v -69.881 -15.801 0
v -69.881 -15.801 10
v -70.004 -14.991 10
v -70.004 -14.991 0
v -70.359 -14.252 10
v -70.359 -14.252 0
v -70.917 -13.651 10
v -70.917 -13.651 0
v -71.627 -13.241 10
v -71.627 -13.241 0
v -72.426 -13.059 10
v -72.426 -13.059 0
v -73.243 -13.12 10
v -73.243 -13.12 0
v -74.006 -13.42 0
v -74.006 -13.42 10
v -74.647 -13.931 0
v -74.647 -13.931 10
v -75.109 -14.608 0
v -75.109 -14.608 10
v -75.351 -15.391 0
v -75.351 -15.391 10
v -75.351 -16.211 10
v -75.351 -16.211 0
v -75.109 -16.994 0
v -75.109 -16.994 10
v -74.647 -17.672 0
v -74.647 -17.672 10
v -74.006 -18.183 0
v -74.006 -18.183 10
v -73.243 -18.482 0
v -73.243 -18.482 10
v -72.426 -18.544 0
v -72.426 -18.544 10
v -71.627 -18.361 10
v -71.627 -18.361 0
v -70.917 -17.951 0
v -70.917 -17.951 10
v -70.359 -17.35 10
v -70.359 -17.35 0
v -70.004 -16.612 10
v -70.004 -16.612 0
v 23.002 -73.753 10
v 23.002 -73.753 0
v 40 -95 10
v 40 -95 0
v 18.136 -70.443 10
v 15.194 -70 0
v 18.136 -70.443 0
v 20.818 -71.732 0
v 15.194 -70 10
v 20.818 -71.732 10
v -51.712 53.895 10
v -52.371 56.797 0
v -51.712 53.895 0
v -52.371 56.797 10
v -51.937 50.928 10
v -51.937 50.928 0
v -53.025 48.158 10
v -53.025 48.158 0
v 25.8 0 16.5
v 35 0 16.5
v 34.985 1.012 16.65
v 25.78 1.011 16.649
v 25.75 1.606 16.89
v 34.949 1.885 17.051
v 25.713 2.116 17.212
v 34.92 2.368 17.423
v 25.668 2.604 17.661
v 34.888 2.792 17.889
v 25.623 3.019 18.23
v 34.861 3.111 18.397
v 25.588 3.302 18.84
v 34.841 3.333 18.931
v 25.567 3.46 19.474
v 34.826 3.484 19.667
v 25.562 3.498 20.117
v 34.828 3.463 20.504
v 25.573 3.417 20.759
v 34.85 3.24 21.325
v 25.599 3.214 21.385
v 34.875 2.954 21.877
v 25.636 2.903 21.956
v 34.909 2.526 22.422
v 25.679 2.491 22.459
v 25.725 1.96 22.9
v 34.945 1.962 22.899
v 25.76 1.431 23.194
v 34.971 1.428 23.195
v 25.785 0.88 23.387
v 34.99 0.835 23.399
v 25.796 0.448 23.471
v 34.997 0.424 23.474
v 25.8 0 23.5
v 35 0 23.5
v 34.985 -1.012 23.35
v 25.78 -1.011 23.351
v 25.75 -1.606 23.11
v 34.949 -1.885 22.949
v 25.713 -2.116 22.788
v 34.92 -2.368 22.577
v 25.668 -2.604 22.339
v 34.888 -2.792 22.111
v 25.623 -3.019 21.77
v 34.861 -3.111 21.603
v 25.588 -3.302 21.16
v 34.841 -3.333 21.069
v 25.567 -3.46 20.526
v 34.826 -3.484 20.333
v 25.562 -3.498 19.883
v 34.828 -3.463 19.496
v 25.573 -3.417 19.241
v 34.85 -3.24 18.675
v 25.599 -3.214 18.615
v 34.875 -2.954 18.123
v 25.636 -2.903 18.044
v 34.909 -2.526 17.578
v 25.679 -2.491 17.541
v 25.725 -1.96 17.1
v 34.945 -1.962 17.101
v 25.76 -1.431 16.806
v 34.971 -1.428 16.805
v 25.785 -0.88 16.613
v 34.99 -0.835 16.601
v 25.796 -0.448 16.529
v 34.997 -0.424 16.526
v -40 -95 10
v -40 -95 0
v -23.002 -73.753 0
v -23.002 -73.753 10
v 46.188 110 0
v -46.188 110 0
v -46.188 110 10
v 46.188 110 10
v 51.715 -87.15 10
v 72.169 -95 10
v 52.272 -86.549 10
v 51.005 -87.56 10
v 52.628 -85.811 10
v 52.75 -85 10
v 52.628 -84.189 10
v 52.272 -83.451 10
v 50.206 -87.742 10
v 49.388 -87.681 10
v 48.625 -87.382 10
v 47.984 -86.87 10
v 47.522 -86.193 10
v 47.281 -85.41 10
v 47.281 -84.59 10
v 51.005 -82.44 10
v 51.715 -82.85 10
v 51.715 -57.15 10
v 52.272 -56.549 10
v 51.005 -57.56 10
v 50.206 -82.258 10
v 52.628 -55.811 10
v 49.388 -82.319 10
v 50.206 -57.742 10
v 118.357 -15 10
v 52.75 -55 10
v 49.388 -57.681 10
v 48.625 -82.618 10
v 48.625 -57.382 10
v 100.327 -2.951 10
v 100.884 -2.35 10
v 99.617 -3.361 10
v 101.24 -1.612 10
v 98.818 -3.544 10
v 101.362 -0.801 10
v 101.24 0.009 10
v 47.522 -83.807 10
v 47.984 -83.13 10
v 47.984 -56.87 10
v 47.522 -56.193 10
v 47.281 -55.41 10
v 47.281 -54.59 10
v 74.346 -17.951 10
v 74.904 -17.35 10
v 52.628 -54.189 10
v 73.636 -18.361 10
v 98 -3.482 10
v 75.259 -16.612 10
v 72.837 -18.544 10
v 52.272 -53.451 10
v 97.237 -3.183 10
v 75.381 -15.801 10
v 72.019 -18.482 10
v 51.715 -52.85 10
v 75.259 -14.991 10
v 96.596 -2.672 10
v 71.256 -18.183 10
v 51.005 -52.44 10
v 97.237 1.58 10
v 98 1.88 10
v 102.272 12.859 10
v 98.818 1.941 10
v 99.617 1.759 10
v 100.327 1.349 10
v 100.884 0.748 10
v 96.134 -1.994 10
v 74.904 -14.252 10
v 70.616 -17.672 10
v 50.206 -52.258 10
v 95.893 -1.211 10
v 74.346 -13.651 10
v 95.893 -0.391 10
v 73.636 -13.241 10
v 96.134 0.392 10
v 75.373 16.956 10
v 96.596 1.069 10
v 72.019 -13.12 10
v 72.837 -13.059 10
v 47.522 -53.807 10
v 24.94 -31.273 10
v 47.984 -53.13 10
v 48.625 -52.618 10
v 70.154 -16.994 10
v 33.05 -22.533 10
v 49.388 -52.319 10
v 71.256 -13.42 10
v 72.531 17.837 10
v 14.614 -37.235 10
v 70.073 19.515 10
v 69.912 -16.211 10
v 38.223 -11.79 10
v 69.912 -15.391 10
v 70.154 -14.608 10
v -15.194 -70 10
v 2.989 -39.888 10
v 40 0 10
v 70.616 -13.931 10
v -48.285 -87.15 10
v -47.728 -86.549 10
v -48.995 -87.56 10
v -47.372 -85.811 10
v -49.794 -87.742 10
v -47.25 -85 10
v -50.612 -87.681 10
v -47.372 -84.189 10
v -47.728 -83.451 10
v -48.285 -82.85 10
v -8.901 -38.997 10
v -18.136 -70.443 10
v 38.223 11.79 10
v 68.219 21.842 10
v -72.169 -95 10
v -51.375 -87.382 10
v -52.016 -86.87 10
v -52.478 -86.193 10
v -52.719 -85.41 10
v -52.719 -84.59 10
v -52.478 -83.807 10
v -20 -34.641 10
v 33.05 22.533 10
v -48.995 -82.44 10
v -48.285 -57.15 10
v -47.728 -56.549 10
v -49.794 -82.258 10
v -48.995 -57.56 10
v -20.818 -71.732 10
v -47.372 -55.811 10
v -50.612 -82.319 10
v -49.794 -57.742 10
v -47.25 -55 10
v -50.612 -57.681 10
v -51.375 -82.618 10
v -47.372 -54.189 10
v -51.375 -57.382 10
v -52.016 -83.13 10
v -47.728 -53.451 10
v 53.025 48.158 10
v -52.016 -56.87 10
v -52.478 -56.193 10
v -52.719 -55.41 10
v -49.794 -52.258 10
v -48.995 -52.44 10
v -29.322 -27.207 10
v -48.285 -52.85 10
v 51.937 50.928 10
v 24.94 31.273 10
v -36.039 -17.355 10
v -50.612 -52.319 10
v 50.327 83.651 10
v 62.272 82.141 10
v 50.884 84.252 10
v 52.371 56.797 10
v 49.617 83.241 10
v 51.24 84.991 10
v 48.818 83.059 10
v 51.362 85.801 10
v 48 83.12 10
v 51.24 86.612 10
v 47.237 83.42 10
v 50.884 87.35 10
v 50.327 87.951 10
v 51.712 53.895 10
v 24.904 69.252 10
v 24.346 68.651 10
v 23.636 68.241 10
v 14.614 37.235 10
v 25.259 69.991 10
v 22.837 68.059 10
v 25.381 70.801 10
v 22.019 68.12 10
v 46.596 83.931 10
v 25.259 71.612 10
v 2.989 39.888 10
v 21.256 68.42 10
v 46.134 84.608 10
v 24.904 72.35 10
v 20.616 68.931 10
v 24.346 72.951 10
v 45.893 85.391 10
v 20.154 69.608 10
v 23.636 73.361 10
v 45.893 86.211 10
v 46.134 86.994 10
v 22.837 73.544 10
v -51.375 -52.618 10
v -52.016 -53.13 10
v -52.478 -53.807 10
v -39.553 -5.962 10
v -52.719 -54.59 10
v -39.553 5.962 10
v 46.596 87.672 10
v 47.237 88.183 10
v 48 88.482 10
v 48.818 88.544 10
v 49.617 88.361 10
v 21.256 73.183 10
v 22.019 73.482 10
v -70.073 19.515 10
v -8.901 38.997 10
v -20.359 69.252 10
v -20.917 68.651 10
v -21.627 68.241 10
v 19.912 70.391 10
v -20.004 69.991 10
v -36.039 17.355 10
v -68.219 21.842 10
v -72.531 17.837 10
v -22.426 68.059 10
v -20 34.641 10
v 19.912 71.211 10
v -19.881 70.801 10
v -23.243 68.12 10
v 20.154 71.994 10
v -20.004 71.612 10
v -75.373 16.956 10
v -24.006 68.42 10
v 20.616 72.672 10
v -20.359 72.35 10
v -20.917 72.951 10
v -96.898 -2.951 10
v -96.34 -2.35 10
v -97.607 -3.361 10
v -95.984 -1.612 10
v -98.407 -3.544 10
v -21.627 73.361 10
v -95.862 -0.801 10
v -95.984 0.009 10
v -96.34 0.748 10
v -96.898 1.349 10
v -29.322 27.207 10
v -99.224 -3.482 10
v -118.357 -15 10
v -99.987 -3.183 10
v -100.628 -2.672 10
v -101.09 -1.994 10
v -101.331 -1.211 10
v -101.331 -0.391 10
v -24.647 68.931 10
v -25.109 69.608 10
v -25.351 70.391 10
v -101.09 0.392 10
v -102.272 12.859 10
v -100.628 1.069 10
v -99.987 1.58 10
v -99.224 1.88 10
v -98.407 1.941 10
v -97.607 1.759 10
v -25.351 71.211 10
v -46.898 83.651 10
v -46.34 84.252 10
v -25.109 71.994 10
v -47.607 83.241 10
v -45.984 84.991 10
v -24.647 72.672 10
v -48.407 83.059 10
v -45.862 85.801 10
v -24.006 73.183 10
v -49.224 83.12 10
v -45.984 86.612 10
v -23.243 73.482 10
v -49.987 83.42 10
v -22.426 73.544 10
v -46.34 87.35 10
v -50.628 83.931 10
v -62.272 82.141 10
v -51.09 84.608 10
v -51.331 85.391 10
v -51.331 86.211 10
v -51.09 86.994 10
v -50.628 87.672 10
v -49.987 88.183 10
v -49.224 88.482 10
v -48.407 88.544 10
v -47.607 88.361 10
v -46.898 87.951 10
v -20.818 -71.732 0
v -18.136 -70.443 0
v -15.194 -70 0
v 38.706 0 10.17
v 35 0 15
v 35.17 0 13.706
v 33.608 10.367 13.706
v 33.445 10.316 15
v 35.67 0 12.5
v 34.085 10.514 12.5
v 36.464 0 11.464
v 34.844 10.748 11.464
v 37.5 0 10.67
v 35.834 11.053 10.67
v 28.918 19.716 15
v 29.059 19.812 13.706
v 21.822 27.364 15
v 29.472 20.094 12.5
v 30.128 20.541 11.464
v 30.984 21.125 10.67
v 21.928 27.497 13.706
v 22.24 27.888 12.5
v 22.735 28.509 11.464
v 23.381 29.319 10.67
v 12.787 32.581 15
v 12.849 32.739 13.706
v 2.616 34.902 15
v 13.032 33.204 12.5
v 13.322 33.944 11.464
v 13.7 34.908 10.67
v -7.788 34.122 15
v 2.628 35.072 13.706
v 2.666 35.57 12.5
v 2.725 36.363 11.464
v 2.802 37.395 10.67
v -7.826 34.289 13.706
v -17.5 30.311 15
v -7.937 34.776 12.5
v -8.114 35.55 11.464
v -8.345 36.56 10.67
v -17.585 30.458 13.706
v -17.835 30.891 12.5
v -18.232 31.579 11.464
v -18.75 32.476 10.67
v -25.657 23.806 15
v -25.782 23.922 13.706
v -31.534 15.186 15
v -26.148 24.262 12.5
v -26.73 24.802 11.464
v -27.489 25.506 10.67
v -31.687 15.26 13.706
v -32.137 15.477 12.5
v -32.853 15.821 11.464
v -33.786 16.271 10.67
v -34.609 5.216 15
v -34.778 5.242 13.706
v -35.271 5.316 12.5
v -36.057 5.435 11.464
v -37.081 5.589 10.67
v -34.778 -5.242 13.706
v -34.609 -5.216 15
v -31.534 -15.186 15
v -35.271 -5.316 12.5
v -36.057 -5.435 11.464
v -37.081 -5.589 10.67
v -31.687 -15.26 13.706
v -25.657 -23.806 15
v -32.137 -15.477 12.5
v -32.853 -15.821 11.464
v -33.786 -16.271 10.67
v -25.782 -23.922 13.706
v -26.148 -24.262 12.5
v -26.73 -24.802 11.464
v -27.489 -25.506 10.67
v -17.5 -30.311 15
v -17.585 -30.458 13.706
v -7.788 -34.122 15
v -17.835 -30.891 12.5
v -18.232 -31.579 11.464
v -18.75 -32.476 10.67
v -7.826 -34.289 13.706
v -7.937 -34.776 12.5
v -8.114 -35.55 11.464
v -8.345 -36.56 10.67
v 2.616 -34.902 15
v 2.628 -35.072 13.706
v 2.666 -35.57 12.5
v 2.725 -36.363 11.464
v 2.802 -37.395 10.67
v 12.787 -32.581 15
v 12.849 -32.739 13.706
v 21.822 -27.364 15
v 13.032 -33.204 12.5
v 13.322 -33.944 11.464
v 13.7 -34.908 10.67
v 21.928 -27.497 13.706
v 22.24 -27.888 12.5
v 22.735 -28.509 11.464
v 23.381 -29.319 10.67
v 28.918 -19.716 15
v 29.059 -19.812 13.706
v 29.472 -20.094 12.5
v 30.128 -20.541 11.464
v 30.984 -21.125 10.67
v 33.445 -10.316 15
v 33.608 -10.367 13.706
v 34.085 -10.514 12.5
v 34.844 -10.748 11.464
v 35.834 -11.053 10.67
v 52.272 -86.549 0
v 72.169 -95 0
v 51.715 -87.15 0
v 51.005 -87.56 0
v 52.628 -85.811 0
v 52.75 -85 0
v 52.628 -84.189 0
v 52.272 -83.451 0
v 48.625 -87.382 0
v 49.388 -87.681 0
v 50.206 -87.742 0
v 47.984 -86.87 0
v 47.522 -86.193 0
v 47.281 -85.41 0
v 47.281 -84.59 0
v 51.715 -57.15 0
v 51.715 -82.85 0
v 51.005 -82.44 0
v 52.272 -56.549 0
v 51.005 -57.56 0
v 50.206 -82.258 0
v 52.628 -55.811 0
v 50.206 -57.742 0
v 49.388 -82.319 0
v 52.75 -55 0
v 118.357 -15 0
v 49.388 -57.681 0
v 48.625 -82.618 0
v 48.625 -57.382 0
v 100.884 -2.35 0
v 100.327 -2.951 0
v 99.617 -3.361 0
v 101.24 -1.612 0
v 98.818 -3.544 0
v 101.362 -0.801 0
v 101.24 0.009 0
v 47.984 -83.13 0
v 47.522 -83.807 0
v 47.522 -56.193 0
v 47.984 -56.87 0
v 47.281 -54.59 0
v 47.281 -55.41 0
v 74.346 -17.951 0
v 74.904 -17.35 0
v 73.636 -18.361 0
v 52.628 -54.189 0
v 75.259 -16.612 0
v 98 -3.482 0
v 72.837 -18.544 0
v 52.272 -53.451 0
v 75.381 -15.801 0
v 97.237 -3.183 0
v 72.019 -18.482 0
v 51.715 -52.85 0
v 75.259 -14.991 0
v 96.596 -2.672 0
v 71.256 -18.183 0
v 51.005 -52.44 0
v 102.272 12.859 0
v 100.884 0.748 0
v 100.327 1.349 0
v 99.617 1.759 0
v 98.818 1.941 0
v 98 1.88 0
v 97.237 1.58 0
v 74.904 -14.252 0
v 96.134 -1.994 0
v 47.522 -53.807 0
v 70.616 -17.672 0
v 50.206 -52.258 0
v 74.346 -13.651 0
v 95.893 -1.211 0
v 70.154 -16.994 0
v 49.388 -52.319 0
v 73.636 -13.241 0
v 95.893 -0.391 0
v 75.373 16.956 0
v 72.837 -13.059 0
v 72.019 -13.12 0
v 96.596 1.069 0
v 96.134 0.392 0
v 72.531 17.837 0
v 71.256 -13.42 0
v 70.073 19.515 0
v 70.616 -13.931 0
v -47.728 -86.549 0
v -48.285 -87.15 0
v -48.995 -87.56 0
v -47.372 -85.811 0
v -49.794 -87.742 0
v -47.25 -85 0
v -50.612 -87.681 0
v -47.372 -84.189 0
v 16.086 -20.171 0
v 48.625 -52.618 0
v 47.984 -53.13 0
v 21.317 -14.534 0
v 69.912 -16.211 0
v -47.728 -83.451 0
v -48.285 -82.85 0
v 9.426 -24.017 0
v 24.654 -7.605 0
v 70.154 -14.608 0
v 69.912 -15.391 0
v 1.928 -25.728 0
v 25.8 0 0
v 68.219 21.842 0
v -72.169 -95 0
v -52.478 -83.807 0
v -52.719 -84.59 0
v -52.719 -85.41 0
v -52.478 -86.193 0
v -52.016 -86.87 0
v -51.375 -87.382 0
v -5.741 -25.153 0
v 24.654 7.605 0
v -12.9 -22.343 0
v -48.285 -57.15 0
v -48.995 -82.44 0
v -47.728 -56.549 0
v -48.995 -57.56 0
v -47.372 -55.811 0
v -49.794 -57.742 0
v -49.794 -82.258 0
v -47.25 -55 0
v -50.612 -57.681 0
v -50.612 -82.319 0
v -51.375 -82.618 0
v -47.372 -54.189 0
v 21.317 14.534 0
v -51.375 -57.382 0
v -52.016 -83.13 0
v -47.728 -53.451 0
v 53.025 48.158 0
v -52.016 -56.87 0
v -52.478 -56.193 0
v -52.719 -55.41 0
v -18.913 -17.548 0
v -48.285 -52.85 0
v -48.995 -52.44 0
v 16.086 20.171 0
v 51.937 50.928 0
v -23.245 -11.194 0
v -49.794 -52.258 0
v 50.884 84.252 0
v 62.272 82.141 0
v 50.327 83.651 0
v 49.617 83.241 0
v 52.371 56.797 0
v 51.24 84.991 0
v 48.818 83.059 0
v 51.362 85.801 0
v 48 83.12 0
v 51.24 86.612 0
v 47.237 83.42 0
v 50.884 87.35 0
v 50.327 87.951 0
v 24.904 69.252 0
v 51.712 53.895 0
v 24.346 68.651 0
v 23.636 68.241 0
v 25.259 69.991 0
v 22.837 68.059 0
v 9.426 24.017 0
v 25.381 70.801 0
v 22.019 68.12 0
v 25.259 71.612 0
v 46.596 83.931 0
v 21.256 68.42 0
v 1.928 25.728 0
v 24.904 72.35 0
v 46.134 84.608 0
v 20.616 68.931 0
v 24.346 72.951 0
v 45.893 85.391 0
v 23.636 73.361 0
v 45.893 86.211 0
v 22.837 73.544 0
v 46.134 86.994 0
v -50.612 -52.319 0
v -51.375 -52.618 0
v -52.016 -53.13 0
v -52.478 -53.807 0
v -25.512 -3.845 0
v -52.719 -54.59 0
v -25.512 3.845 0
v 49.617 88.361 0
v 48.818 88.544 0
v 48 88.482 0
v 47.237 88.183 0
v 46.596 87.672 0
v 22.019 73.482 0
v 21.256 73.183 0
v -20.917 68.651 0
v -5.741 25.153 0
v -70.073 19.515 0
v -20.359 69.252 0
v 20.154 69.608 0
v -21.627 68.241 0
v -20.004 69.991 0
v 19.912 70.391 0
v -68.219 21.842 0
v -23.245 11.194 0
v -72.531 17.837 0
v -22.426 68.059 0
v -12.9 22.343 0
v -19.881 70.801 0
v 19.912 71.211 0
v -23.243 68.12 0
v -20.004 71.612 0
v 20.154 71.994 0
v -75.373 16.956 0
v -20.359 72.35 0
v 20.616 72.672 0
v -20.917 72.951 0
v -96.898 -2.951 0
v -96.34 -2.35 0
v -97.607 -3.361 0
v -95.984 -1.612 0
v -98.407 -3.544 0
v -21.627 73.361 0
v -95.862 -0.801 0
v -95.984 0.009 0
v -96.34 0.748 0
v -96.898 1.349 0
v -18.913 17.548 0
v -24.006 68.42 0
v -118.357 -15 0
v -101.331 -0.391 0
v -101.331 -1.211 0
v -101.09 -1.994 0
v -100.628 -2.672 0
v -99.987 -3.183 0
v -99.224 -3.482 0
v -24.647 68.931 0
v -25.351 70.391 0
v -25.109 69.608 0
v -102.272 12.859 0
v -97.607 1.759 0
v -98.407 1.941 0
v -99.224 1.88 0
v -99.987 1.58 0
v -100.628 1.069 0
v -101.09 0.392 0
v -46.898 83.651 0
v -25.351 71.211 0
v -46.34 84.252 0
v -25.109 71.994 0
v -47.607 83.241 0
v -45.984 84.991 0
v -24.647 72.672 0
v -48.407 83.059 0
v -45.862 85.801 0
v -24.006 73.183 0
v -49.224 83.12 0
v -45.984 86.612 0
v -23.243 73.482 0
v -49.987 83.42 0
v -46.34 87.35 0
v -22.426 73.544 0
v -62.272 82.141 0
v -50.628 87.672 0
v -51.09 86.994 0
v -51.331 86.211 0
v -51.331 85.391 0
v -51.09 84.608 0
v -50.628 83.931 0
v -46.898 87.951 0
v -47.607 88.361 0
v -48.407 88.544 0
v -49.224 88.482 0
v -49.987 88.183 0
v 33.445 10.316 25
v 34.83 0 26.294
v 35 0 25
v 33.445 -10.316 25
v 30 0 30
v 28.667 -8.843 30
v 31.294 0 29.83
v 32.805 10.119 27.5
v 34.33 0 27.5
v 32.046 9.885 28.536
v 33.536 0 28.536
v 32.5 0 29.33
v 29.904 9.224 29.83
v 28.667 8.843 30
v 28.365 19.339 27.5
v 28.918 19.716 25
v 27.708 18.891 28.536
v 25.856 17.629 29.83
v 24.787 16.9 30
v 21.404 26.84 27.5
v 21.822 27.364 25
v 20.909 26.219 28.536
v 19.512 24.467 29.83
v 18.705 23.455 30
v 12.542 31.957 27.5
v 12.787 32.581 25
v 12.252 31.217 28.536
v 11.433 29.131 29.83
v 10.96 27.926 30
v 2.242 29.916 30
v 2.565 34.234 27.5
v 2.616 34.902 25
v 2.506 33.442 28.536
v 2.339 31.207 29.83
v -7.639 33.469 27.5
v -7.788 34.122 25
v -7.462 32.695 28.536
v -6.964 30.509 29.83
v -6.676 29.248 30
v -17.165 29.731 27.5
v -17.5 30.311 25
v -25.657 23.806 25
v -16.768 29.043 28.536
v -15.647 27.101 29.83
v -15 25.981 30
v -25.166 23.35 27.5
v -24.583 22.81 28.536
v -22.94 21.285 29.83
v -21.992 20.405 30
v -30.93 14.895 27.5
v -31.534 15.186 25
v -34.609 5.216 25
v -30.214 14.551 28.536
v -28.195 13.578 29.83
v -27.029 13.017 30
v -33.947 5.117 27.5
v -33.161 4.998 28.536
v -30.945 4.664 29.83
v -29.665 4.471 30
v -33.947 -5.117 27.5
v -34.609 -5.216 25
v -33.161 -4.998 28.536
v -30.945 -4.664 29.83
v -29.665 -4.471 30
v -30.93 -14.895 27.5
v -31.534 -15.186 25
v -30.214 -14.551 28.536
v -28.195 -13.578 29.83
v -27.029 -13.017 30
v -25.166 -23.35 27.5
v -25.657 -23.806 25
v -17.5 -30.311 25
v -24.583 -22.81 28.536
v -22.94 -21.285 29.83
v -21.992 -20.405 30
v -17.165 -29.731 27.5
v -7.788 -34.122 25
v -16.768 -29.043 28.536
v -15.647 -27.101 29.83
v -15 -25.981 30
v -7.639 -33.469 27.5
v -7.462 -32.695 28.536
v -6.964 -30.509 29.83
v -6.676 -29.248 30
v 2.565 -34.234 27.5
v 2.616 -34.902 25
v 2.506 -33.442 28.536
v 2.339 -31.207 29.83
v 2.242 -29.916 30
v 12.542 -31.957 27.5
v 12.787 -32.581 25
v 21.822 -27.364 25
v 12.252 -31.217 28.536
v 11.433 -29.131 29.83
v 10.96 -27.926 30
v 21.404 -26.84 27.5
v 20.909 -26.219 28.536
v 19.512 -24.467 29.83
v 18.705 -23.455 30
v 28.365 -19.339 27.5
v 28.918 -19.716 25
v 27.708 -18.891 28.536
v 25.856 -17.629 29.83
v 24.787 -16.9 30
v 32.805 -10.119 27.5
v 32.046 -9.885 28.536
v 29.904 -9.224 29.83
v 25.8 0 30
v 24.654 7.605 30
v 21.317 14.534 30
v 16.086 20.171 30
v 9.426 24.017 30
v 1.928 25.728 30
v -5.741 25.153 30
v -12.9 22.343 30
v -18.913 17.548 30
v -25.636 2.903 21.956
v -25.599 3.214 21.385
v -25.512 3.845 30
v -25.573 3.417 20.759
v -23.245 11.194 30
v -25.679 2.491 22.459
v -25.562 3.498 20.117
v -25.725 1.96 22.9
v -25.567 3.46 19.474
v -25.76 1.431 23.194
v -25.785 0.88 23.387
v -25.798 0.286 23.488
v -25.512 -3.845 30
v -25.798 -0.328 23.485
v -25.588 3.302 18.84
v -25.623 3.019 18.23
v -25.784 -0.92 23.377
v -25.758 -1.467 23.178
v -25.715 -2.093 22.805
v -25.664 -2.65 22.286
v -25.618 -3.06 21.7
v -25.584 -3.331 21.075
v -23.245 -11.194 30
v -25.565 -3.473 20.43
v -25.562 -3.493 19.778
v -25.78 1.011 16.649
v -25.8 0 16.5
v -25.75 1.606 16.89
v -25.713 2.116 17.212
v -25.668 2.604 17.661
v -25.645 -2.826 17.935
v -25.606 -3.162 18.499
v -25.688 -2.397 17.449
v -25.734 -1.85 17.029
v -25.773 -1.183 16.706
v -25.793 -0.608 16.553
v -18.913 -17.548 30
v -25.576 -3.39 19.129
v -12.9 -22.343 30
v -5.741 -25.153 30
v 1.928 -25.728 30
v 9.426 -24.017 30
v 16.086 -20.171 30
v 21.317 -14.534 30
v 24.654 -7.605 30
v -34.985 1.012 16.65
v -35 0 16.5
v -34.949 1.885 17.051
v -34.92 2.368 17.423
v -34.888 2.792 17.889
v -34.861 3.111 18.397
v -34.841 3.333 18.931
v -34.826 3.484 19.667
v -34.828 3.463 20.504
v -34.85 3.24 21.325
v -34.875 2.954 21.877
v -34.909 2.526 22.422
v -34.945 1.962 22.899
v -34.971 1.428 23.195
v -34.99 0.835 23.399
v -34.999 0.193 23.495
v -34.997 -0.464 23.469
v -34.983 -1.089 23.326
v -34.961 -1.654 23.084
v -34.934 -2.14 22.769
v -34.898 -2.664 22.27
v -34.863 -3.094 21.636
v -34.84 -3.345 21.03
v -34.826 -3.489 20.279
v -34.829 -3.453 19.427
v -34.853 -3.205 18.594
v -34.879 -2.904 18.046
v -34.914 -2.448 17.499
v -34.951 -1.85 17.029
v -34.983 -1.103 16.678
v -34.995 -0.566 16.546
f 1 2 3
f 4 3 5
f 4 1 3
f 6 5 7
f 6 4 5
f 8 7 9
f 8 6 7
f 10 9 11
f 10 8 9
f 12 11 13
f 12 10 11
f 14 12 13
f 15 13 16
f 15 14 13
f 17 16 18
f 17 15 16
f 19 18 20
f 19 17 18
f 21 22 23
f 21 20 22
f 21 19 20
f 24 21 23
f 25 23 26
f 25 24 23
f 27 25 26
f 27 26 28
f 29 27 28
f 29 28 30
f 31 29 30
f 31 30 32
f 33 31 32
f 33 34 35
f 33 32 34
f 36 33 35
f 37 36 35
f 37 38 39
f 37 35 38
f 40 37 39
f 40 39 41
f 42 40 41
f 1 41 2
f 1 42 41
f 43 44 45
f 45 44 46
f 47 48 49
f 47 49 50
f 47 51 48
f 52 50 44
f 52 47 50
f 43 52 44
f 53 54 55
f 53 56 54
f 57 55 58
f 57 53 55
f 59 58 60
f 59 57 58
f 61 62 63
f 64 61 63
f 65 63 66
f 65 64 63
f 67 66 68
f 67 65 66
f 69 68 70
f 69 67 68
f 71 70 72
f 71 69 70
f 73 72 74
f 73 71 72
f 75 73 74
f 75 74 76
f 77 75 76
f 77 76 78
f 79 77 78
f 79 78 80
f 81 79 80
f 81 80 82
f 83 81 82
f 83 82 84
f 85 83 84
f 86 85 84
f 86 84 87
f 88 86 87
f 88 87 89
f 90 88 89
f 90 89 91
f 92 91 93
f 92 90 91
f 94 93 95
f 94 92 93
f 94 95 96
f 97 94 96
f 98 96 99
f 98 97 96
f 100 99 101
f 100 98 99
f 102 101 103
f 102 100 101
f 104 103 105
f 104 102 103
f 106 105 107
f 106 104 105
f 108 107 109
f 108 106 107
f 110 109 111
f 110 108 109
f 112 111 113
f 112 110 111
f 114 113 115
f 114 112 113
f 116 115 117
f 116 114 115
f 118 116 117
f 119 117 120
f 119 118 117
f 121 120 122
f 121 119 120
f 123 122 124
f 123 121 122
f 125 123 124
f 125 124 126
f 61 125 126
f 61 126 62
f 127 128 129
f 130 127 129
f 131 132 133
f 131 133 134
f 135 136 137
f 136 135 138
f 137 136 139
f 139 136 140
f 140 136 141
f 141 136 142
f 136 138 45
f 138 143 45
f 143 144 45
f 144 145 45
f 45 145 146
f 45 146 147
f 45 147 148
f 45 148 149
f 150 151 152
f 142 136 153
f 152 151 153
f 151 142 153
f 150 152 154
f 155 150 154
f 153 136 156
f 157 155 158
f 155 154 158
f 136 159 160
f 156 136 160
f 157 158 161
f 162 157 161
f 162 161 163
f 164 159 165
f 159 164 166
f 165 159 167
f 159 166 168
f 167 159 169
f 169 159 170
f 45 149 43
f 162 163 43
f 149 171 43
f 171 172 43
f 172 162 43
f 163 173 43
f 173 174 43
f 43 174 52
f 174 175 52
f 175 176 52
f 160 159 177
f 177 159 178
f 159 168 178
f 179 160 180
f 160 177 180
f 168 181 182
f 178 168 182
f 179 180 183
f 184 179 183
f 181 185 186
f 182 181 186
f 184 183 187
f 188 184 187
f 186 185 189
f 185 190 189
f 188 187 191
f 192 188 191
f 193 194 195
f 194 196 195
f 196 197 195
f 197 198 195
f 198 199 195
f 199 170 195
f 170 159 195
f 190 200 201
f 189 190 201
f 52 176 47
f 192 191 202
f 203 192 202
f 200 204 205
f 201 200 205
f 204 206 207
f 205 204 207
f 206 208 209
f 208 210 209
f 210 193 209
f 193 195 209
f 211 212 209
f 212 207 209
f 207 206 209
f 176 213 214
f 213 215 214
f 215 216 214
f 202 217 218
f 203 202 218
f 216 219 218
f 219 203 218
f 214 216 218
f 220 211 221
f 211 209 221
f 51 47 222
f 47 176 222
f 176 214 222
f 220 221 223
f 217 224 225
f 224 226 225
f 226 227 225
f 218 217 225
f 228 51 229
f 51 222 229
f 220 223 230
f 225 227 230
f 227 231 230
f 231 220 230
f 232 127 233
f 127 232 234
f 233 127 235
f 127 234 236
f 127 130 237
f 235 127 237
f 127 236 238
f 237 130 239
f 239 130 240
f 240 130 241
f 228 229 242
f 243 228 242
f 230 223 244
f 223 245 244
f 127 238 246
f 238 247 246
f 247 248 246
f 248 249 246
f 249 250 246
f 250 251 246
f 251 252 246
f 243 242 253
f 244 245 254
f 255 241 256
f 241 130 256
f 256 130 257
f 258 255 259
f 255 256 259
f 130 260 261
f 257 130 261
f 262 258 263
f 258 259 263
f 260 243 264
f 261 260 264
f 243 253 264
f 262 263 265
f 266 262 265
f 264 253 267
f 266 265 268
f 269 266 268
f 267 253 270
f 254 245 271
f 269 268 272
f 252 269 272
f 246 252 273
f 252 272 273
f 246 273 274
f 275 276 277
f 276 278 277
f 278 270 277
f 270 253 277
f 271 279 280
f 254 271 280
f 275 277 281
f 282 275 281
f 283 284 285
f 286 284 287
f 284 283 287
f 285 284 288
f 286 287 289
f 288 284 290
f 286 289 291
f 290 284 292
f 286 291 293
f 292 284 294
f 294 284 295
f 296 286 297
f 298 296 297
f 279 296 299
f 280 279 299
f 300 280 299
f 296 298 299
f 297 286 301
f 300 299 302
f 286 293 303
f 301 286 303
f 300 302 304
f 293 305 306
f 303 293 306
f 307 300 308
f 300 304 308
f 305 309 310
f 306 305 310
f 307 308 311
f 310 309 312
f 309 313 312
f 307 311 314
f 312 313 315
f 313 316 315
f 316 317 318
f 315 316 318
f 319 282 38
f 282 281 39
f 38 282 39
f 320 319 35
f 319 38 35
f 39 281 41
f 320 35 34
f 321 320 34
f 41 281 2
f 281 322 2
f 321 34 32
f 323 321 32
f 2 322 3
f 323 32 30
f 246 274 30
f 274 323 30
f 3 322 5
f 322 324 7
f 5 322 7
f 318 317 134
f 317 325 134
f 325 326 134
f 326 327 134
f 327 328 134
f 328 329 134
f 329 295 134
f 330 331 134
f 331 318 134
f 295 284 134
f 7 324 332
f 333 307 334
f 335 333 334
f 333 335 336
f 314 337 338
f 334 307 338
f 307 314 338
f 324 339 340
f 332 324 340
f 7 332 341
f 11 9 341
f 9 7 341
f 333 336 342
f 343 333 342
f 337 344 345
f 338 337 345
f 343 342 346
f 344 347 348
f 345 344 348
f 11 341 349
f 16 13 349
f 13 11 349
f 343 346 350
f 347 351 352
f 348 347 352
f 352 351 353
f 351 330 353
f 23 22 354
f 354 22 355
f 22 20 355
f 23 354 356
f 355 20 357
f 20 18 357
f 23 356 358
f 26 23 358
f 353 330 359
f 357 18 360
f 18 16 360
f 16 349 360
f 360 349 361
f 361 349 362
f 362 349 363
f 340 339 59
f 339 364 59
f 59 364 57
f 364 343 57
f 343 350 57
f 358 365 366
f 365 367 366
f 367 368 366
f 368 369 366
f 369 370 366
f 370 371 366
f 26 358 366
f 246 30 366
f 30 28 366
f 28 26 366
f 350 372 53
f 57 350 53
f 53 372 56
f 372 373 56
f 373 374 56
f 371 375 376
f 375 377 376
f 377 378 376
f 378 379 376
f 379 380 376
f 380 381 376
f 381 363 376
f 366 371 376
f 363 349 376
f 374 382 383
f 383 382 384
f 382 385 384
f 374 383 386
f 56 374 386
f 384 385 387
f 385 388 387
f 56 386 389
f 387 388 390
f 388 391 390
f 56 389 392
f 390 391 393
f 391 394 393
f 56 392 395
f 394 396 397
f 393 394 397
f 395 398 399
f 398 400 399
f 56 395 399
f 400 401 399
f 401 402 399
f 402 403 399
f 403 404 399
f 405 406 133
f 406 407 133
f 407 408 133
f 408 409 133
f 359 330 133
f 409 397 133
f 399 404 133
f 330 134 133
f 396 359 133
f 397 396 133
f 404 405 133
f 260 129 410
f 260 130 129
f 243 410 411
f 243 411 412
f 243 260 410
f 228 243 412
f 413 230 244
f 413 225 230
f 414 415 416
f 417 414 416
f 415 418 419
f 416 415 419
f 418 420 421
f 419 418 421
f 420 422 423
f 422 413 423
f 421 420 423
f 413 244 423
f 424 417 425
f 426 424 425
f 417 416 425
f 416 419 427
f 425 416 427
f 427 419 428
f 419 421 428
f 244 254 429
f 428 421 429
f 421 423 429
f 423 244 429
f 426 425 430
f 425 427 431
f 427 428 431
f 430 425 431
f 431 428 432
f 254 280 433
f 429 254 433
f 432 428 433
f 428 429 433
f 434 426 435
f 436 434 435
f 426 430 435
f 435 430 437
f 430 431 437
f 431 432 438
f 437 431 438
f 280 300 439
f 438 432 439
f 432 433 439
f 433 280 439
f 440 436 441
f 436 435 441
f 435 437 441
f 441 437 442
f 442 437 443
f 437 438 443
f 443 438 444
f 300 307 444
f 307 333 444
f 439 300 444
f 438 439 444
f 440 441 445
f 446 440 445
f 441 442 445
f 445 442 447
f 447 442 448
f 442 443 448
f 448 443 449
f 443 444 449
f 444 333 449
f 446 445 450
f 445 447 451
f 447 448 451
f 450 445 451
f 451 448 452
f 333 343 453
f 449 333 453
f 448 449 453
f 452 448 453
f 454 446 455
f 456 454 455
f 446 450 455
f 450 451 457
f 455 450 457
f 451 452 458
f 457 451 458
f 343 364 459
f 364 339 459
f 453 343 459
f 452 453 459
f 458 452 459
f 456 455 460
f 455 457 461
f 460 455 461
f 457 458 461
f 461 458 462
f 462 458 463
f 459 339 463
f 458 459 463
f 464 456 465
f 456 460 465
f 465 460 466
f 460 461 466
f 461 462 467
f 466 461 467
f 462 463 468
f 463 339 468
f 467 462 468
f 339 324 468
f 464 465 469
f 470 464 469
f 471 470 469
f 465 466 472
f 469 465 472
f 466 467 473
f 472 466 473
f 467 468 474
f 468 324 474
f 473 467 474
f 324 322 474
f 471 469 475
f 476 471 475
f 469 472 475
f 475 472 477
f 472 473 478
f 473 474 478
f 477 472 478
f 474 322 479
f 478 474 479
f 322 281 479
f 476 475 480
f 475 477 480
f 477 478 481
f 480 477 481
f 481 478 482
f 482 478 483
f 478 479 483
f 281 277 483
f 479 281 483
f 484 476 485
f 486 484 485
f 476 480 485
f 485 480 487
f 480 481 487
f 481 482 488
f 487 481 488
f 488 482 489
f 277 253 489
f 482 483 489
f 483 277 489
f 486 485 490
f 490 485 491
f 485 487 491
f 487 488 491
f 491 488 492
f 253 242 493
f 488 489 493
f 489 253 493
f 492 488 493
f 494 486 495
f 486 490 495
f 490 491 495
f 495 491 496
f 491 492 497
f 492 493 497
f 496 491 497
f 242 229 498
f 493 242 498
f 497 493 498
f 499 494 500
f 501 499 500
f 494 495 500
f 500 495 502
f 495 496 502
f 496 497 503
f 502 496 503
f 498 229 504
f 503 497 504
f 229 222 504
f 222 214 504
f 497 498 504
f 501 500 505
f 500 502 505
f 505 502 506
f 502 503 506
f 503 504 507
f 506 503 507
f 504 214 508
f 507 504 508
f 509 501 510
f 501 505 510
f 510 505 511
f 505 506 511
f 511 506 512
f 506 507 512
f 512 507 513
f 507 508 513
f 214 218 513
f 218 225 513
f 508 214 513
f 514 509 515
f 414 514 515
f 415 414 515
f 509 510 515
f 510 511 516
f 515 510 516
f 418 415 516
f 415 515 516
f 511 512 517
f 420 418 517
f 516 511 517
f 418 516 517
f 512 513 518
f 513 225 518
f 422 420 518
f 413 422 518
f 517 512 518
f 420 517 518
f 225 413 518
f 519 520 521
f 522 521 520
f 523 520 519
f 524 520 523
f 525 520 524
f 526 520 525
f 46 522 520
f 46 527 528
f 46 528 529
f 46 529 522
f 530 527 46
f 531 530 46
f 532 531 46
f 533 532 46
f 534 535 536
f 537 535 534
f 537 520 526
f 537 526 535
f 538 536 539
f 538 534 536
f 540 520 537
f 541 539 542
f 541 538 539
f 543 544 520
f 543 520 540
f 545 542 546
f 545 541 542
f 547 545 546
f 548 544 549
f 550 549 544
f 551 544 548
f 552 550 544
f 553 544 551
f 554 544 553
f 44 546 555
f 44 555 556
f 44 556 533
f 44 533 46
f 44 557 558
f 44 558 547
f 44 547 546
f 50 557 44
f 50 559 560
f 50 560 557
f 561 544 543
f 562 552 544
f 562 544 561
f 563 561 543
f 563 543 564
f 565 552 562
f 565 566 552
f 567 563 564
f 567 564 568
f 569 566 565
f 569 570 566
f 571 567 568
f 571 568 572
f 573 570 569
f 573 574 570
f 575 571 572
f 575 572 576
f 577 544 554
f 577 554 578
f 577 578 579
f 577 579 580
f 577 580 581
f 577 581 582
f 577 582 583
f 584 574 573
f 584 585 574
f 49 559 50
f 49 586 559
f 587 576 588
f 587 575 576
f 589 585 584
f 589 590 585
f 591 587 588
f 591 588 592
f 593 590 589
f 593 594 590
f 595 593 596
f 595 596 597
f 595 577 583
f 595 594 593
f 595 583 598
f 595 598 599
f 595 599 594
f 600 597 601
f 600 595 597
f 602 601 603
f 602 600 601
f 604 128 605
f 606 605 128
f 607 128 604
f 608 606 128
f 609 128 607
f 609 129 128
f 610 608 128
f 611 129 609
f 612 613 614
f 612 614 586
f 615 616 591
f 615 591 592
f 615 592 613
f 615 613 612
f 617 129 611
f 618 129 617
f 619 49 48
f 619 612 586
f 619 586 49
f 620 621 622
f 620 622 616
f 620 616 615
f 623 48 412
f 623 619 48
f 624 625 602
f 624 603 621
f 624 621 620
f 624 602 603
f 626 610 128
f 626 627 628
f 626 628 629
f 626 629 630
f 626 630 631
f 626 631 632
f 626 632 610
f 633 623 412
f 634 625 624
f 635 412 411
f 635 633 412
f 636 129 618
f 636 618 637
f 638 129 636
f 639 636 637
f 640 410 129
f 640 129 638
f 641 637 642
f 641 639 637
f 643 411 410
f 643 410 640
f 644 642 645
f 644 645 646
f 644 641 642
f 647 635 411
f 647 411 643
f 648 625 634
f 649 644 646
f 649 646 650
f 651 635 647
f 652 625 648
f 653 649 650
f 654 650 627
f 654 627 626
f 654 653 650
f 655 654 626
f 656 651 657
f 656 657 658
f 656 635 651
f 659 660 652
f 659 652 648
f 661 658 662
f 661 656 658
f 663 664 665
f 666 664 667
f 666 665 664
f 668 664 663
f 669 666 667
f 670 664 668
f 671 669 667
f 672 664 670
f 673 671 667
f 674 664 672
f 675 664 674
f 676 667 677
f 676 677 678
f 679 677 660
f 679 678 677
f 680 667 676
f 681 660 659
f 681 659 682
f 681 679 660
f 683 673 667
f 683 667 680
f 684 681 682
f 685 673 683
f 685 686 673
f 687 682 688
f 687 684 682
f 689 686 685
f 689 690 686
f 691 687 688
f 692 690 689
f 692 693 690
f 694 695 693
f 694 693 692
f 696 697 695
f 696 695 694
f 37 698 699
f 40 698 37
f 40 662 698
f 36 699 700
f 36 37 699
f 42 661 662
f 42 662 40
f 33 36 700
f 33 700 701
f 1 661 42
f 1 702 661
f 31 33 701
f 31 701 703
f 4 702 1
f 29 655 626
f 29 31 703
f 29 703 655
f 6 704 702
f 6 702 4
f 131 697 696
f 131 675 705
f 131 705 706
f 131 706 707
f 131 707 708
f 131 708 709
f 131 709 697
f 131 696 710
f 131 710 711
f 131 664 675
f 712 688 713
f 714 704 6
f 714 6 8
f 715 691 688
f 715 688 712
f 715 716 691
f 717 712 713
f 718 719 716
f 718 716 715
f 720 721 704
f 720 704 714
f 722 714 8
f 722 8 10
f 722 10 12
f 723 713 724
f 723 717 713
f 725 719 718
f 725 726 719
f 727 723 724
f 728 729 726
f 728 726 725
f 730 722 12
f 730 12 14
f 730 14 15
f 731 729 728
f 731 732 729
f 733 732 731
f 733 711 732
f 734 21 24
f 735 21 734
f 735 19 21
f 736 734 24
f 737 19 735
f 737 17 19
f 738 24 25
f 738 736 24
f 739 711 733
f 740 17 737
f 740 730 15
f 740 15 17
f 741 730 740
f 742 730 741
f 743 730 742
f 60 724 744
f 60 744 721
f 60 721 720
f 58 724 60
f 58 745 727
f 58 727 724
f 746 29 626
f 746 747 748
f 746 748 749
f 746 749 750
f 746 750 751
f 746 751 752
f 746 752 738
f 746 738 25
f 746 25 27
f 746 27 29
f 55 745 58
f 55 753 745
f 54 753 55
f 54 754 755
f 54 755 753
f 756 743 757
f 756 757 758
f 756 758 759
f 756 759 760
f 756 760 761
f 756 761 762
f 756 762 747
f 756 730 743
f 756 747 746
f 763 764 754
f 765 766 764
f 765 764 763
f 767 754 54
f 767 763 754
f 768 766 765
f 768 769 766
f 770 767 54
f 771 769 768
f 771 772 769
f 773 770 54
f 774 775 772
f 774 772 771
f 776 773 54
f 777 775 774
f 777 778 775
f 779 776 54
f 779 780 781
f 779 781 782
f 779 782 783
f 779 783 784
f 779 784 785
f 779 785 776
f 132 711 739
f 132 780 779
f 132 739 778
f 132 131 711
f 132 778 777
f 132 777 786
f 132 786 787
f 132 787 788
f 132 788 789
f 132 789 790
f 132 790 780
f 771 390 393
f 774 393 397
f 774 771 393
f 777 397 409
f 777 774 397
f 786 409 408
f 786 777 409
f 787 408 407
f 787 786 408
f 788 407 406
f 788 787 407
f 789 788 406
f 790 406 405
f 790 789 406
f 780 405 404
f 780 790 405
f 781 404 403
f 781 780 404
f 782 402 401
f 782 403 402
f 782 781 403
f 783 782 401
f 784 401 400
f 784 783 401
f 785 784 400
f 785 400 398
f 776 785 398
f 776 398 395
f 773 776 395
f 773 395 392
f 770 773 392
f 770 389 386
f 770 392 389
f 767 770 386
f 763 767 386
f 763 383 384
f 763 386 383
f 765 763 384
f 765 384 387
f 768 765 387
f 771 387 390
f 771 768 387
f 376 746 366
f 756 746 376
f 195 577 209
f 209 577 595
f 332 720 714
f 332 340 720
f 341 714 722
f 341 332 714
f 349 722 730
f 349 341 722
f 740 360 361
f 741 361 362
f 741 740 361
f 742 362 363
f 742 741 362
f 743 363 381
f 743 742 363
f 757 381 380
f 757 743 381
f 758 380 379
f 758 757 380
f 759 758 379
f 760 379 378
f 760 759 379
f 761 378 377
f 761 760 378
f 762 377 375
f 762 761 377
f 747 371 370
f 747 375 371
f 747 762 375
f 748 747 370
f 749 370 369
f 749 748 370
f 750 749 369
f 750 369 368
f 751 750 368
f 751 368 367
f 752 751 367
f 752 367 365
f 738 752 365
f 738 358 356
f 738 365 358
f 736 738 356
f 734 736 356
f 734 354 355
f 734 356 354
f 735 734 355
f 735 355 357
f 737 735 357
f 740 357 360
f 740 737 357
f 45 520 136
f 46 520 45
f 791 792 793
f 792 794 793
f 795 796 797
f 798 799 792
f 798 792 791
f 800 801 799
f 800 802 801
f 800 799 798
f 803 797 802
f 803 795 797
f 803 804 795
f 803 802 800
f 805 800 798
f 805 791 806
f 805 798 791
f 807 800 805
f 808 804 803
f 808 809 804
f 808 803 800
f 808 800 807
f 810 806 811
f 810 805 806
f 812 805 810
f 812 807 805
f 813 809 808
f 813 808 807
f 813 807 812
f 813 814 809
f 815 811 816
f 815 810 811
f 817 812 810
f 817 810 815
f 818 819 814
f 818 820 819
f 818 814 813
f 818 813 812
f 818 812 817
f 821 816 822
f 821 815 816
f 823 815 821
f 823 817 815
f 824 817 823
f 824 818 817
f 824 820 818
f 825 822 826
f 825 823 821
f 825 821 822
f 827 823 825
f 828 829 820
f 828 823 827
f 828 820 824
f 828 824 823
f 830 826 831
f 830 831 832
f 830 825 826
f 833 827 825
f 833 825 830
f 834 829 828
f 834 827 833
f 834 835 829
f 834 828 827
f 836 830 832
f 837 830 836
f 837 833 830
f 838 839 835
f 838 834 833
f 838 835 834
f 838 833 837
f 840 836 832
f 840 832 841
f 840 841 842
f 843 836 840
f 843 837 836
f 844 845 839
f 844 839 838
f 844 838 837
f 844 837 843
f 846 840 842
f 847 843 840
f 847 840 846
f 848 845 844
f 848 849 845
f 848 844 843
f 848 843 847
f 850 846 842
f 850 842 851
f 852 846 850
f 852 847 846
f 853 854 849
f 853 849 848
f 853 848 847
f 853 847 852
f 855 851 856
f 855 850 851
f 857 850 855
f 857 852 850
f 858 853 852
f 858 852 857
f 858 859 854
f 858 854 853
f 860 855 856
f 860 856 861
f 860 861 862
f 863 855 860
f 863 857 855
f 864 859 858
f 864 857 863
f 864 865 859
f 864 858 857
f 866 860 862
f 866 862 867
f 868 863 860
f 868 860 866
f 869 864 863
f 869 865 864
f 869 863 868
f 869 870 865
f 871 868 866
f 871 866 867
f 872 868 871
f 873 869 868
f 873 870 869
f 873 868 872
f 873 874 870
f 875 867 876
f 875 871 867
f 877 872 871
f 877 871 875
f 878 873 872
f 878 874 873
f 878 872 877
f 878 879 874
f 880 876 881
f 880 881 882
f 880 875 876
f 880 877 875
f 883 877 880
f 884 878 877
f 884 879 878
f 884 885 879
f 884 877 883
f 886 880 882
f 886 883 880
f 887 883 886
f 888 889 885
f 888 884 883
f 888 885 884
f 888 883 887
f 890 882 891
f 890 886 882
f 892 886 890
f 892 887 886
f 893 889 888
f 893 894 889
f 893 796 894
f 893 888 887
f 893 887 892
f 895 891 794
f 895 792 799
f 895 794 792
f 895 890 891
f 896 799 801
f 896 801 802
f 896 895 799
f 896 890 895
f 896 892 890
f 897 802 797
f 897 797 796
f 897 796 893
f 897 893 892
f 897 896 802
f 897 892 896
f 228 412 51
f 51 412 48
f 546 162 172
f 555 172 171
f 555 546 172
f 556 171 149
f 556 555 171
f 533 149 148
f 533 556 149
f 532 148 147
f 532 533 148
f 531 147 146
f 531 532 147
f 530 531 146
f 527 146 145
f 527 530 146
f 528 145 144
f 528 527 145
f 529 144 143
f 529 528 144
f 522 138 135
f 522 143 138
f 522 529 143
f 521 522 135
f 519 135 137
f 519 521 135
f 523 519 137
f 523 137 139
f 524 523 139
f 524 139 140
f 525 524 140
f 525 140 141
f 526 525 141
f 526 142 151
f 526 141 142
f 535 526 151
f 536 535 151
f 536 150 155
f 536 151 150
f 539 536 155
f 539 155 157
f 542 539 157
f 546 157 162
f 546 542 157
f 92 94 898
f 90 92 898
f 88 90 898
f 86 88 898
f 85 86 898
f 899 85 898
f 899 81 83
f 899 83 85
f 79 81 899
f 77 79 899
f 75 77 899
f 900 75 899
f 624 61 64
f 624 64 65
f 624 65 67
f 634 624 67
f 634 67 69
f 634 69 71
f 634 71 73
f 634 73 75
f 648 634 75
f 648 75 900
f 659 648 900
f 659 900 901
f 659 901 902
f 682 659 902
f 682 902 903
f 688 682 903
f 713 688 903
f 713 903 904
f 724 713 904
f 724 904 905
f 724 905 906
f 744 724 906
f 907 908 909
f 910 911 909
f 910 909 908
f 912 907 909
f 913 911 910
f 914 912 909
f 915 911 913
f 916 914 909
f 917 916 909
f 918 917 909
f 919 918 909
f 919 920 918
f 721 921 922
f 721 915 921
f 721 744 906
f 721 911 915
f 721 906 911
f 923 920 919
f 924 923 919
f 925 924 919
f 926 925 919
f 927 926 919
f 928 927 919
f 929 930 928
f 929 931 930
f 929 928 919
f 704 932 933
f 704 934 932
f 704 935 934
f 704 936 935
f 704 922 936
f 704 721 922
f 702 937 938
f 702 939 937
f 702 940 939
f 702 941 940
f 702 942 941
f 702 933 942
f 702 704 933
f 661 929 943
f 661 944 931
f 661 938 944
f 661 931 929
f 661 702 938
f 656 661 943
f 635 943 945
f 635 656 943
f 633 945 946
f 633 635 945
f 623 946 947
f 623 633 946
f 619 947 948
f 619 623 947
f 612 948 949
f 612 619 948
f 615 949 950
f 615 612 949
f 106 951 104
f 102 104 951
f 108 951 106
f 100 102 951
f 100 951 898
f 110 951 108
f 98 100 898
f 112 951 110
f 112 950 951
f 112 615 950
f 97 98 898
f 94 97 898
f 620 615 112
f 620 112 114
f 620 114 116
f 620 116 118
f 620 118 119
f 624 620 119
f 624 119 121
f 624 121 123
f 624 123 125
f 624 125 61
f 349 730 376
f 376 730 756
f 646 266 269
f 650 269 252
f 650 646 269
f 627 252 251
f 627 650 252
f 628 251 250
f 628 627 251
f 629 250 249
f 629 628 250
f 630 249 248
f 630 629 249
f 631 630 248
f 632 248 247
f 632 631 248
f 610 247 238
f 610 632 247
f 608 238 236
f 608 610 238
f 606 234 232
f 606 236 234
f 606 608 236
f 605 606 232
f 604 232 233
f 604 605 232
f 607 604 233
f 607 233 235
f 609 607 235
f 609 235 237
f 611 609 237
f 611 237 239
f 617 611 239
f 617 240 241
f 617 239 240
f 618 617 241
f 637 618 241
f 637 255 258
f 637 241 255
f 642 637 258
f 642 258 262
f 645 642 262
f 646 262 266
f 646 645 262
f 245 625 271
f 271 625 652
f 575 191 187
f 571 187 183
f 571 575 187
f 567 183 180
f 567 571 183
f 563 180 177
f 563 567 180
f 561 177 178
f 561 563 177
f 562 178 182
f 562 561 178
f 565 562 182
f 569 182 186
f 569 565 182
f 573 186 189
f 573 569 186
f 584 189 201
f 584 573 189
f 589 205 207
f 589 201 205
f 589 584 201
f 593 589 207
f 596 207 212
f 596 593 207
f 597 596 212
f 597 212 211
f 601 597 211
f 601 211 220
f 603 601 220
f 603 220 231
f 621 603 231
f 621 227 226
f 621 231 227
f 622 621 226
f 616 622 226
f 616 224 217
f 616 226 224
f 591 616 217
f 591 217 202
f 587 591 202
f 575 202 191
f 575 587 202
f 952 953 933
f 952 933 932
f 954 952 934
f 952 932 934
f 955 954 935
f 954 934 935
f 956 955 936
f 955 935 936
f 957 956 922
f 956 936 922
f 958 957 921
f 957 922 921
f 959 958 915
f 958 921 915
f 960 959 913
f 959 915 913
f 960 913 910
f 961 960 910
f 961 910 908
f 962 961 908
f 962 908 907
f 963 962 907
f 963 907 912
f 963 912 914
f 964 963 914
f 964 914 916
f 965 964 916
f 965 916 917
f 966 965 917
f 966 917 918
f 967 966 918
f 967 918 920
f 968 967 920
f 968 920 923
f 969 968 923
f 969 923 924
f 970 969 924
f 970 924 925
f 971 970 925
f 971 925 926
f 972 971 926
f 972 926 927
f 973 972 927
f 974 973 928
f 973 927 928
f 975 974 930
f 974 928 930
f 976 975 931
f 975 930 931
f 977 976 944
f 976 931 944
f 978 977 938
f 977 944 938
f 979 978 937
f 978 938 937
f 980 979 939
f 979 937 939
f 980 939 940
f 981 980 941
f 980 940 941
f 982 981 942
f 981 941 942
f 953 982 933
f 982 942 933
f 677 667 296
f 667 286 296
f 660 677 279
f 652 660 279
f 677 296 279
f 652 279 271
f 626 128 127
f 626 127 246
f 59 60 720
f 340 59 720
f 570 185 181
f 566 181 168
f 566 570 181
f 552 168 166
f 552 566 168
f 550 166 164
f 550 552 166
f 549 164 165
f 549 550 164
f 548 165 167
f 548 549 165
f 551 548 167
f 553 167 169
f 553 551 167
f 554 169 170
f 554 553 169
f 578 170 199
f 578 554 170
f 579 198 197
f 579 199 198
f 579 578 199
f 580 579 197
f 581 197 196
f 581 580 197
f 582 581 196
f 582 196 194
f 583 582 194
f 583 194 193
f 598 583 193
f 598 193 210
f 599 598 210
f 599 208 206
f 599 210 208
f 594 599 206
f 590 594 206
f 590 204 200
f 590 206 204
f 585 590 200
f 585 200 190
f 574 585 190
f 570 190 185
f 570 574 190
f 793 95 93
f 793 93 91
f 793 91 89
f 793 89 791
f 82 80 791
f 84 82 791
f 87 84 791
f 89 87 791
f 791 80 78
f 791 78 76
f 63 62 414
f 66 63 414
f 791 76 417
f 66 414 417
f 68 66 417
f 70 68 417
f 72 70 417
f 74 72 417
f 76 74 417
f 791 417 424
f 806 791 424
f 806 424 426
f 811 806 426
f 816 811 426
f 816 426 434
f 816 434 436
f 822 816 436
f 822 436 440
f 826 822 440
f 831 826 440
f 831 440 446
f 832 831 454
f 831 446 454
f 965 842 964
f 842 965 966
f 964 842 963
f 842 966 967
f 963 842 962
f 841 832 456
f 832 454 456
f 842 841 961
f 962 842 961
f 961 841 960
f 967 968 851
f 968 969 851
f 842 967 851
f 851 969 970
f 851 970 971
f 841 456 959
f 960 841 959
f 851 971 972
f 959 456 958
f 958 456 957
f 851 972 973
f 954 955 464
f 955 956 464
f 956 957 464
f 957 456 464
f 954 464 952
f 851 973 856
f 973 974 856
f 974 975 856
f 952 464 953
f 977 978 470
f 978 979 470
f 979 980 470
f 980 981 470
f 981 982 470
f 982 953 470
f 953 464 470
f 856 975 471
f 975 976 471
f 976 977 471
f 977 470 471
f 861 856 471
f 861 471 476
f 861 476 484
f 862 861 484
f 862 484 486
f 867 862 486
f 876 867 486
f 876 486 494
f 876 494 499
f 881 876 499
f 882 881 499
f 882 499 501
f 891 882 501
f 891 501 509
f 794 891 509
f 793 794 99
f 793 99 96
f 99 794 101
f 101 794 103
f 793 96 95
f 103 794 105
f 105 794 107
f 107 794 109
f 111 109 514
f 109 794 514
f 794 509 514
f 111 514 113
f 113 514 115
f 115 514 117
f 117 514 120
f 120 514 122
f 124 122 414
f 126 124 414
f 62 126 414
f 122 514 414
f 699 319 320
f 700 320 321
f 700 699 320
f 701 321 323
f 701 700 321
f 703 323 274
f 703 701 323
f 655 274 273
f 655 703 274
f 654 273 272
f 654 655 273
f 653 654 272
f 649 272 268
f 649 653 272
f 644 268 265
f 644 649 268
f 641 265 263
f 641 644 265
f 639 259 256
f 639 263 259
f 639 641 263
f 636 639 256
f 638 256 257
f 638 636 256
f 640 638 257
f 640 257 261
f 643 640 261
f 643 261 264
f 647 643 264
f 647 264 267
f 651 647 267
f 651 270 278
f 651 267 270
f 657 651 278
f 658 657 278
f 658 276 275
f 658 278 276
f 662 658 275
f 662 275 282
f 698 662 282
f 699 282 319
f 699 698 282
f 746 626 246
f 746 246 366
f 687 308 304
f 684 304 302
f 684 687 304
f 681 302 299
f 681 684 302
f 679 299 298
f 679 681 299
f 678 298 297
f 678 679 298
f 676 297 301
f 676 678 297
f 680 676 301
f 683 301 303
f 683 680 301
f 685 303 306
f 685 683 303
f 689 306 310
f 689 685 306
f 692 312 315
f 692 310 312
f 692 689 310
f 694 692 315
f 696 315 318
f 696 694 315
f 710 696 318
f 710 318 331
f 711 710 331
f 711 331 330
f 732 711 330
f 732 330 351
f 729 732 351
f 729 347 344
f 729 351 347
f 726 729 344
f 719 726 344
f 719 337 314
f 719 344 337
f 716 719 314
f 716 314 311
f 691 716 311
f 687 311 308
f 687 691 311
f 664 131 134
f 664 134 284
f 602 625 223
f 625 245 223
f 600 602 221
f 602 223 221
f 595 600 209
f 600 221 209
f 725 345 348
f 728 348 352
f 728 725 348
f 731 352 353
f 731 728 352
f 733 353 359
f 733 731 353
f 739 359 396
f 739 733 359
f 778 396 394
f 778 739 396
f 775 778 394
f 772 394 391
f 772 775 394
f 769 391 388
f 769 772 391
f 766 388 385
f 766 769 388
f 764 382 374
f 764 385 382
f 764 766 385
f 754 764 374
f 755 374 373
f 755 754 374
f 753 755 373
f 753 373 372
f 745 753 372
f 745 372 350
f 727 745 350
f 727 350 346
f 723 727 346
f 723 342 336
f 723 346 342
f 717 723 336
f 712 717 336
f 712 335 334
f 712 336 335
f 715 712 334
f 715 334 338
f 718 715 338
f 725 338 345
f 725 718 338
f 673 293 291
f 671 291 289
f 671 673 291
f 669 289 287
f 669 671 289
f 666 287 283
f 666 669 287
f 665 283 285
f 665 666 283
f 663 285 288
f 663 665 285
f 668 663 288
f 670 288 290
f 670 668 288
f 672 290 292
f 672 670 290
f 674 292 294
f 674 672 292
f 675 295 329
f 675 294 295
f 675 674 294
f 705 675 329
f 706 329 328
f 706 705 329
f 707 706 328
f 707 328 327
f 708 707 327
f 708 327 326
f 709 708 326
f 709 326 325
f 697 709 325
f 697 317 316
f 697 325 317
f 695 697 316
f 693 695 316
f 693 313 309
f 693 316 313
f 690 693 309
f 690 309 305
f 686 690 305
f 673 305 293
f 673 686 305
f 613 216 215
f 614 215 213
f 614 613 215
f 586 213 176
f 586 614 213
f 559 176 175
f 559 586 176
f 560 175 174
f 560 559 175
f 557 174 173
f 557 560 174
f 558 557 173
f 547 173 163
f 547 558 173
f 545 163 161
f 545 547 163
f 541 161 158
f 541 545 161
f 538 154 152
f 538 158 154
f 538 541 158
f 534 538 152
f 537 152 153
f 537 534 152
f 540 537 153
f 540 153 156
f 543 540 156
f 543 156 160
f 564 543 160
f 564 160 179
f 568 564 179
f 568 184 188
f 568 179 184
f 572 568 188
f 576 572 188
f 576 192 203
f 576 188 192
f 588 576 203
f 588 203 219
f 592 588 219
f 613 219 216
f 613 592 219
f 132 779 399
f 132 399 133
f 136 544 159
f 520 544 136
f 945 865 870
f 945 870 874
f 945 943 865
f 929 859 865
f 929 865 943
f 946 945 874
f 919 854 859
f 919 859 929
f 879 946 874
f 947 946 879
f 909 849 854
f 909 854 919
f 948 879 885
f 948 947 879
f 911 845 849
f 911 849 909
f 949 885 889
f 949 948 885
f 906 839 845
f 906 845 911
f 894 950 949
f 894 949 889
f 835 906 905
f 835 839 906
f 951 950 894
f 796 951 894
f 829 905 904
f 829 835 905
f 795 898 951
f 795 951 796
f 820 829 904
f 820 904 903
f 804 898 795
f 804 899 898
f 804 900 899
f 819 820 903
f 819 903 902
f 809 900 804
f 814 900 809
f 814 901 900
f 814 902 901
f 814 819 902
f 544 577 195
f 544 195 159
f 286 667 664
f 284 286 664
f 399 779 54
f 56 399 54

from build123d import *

# Parameters (mm, degrees)
SKETCH011_R        = 25.8
PAD007_DEPTH       = 10
SKETCH012_R        = 2.75
POCKET003_DEPTH    = 636.6056068561
POLARPATTERN_COUNT = 3
SKETCH_R           = 35
SKETCH_R_2         = 25.8
PAD_DEPTH          = 20
FILLET_R           = 5
SKETCH013_R        = 3.5
POCKET_DEPTH       = 118.3578051839
POCKET_DEPTH_BACK  = 118.3578051839
FILLET001_R        = 10


with BuildPart() as part:
    # Sketch011 → Pad007 (new body)
    with BuildSketch(Plane.XY):
        Polygon((-46.1880215352, 110), (46.1880215352, 110), (118.3568051839, -15), (72.1687836487, -95), (-72.1687836487, -95), (-118.3568051839, -15), align=None)
        Circle(SKETCH011_R, mode=Mode.SUBTRACT)
    extrude(amount=PAD007_DEPTH)

    # Sketch012 → Pocket003 (cut, through all)
    with BuildSketch(Plane.XY):
        with Locations((-48.6121593217, 85.8012701892)):
            Circle(SKETCH012_R)
        with Locations((-98.6121593217, -0.8012701892)):
            Circle(SKETCH012_R)
        with Locations((-22.6313972081, 70.8012701892)):
            Circle(SKETCH012_R)
        with Locations((-72.6313972081, -15.8012701892)):
            Circle(SKETCH012_R)
        Polygon((-62.2724133595, 82.1410161514), (-50.6217782649, 52.3205080757), (-70.6217782649, 17.6794919243), (-102.2724133595, 12.8589838486), align=None)
    pocket003 = extrude(amount=POCKET003_DEPTH, mode=Mode.SUBTRACT)

    # PolarPattern: Pocket003 ×3 about axis
    polarpattern_axis = Axis((0, 0, 0), (0, 0, 1))
    for i in range(1, POLARPATTERN_COUNT):
        add(pocket003.rotate(polarpattern_axis, i * 360 / POLARPATTERN_COUNT), mode=Mode.SUBTRACT)

    # Sketch (on Face5 of PolarPattern) → Pad (join)
    with BuildSketch(Plane.XY.offset(10)):
        Circle(SKETCH_R)
        Circle(SKETCH_R_2, mode=Mode.SUBTRACT)
    extrude(amount=PAD_DEPTH)

    # Fillet
    fillet_edges = [part.edges().sort_by_distance(p)[0] for p in [
        (-35, 0, 10),
        (-35, 0, 30),
    ]]
    fillet(fillet_edges, radius=FILLET_R)

    # Sketch013 (on DatumPlane) → Pocket (cut, two sides)
    with BuildSketch(Plane(origin=(0, 0, 15), x_dir=(0, 0, -1), z_dir=(1, 0, 0))) as pocket_sk:
        with Locations((-5, 0)):
            Circle(SKETCH013_R)
    extrude(amount=-POCKET_DEPTH, mode=Mode.SUBTRACT)
    extrude(pocket_sk.sketch, amount=POCKET_DEPTH_BACK, mode=Mode.SUBTRACT)

    # Fillet001
    fillet001_edges = [part.edges().sort_by_distance(p)[0] for p in [
        (20, -70, 5),
        (-20, -70, 5),
        (50.621778, 52.320508, 5),
        (70.621778, 17.679492, 5),
        (-50.621778, 52.320508, 5),
        (-70.621778, 17.679492, 5),
    ]]
    fillet(fillet001_edges, radius=FILLET001_R)


solid = part.part
